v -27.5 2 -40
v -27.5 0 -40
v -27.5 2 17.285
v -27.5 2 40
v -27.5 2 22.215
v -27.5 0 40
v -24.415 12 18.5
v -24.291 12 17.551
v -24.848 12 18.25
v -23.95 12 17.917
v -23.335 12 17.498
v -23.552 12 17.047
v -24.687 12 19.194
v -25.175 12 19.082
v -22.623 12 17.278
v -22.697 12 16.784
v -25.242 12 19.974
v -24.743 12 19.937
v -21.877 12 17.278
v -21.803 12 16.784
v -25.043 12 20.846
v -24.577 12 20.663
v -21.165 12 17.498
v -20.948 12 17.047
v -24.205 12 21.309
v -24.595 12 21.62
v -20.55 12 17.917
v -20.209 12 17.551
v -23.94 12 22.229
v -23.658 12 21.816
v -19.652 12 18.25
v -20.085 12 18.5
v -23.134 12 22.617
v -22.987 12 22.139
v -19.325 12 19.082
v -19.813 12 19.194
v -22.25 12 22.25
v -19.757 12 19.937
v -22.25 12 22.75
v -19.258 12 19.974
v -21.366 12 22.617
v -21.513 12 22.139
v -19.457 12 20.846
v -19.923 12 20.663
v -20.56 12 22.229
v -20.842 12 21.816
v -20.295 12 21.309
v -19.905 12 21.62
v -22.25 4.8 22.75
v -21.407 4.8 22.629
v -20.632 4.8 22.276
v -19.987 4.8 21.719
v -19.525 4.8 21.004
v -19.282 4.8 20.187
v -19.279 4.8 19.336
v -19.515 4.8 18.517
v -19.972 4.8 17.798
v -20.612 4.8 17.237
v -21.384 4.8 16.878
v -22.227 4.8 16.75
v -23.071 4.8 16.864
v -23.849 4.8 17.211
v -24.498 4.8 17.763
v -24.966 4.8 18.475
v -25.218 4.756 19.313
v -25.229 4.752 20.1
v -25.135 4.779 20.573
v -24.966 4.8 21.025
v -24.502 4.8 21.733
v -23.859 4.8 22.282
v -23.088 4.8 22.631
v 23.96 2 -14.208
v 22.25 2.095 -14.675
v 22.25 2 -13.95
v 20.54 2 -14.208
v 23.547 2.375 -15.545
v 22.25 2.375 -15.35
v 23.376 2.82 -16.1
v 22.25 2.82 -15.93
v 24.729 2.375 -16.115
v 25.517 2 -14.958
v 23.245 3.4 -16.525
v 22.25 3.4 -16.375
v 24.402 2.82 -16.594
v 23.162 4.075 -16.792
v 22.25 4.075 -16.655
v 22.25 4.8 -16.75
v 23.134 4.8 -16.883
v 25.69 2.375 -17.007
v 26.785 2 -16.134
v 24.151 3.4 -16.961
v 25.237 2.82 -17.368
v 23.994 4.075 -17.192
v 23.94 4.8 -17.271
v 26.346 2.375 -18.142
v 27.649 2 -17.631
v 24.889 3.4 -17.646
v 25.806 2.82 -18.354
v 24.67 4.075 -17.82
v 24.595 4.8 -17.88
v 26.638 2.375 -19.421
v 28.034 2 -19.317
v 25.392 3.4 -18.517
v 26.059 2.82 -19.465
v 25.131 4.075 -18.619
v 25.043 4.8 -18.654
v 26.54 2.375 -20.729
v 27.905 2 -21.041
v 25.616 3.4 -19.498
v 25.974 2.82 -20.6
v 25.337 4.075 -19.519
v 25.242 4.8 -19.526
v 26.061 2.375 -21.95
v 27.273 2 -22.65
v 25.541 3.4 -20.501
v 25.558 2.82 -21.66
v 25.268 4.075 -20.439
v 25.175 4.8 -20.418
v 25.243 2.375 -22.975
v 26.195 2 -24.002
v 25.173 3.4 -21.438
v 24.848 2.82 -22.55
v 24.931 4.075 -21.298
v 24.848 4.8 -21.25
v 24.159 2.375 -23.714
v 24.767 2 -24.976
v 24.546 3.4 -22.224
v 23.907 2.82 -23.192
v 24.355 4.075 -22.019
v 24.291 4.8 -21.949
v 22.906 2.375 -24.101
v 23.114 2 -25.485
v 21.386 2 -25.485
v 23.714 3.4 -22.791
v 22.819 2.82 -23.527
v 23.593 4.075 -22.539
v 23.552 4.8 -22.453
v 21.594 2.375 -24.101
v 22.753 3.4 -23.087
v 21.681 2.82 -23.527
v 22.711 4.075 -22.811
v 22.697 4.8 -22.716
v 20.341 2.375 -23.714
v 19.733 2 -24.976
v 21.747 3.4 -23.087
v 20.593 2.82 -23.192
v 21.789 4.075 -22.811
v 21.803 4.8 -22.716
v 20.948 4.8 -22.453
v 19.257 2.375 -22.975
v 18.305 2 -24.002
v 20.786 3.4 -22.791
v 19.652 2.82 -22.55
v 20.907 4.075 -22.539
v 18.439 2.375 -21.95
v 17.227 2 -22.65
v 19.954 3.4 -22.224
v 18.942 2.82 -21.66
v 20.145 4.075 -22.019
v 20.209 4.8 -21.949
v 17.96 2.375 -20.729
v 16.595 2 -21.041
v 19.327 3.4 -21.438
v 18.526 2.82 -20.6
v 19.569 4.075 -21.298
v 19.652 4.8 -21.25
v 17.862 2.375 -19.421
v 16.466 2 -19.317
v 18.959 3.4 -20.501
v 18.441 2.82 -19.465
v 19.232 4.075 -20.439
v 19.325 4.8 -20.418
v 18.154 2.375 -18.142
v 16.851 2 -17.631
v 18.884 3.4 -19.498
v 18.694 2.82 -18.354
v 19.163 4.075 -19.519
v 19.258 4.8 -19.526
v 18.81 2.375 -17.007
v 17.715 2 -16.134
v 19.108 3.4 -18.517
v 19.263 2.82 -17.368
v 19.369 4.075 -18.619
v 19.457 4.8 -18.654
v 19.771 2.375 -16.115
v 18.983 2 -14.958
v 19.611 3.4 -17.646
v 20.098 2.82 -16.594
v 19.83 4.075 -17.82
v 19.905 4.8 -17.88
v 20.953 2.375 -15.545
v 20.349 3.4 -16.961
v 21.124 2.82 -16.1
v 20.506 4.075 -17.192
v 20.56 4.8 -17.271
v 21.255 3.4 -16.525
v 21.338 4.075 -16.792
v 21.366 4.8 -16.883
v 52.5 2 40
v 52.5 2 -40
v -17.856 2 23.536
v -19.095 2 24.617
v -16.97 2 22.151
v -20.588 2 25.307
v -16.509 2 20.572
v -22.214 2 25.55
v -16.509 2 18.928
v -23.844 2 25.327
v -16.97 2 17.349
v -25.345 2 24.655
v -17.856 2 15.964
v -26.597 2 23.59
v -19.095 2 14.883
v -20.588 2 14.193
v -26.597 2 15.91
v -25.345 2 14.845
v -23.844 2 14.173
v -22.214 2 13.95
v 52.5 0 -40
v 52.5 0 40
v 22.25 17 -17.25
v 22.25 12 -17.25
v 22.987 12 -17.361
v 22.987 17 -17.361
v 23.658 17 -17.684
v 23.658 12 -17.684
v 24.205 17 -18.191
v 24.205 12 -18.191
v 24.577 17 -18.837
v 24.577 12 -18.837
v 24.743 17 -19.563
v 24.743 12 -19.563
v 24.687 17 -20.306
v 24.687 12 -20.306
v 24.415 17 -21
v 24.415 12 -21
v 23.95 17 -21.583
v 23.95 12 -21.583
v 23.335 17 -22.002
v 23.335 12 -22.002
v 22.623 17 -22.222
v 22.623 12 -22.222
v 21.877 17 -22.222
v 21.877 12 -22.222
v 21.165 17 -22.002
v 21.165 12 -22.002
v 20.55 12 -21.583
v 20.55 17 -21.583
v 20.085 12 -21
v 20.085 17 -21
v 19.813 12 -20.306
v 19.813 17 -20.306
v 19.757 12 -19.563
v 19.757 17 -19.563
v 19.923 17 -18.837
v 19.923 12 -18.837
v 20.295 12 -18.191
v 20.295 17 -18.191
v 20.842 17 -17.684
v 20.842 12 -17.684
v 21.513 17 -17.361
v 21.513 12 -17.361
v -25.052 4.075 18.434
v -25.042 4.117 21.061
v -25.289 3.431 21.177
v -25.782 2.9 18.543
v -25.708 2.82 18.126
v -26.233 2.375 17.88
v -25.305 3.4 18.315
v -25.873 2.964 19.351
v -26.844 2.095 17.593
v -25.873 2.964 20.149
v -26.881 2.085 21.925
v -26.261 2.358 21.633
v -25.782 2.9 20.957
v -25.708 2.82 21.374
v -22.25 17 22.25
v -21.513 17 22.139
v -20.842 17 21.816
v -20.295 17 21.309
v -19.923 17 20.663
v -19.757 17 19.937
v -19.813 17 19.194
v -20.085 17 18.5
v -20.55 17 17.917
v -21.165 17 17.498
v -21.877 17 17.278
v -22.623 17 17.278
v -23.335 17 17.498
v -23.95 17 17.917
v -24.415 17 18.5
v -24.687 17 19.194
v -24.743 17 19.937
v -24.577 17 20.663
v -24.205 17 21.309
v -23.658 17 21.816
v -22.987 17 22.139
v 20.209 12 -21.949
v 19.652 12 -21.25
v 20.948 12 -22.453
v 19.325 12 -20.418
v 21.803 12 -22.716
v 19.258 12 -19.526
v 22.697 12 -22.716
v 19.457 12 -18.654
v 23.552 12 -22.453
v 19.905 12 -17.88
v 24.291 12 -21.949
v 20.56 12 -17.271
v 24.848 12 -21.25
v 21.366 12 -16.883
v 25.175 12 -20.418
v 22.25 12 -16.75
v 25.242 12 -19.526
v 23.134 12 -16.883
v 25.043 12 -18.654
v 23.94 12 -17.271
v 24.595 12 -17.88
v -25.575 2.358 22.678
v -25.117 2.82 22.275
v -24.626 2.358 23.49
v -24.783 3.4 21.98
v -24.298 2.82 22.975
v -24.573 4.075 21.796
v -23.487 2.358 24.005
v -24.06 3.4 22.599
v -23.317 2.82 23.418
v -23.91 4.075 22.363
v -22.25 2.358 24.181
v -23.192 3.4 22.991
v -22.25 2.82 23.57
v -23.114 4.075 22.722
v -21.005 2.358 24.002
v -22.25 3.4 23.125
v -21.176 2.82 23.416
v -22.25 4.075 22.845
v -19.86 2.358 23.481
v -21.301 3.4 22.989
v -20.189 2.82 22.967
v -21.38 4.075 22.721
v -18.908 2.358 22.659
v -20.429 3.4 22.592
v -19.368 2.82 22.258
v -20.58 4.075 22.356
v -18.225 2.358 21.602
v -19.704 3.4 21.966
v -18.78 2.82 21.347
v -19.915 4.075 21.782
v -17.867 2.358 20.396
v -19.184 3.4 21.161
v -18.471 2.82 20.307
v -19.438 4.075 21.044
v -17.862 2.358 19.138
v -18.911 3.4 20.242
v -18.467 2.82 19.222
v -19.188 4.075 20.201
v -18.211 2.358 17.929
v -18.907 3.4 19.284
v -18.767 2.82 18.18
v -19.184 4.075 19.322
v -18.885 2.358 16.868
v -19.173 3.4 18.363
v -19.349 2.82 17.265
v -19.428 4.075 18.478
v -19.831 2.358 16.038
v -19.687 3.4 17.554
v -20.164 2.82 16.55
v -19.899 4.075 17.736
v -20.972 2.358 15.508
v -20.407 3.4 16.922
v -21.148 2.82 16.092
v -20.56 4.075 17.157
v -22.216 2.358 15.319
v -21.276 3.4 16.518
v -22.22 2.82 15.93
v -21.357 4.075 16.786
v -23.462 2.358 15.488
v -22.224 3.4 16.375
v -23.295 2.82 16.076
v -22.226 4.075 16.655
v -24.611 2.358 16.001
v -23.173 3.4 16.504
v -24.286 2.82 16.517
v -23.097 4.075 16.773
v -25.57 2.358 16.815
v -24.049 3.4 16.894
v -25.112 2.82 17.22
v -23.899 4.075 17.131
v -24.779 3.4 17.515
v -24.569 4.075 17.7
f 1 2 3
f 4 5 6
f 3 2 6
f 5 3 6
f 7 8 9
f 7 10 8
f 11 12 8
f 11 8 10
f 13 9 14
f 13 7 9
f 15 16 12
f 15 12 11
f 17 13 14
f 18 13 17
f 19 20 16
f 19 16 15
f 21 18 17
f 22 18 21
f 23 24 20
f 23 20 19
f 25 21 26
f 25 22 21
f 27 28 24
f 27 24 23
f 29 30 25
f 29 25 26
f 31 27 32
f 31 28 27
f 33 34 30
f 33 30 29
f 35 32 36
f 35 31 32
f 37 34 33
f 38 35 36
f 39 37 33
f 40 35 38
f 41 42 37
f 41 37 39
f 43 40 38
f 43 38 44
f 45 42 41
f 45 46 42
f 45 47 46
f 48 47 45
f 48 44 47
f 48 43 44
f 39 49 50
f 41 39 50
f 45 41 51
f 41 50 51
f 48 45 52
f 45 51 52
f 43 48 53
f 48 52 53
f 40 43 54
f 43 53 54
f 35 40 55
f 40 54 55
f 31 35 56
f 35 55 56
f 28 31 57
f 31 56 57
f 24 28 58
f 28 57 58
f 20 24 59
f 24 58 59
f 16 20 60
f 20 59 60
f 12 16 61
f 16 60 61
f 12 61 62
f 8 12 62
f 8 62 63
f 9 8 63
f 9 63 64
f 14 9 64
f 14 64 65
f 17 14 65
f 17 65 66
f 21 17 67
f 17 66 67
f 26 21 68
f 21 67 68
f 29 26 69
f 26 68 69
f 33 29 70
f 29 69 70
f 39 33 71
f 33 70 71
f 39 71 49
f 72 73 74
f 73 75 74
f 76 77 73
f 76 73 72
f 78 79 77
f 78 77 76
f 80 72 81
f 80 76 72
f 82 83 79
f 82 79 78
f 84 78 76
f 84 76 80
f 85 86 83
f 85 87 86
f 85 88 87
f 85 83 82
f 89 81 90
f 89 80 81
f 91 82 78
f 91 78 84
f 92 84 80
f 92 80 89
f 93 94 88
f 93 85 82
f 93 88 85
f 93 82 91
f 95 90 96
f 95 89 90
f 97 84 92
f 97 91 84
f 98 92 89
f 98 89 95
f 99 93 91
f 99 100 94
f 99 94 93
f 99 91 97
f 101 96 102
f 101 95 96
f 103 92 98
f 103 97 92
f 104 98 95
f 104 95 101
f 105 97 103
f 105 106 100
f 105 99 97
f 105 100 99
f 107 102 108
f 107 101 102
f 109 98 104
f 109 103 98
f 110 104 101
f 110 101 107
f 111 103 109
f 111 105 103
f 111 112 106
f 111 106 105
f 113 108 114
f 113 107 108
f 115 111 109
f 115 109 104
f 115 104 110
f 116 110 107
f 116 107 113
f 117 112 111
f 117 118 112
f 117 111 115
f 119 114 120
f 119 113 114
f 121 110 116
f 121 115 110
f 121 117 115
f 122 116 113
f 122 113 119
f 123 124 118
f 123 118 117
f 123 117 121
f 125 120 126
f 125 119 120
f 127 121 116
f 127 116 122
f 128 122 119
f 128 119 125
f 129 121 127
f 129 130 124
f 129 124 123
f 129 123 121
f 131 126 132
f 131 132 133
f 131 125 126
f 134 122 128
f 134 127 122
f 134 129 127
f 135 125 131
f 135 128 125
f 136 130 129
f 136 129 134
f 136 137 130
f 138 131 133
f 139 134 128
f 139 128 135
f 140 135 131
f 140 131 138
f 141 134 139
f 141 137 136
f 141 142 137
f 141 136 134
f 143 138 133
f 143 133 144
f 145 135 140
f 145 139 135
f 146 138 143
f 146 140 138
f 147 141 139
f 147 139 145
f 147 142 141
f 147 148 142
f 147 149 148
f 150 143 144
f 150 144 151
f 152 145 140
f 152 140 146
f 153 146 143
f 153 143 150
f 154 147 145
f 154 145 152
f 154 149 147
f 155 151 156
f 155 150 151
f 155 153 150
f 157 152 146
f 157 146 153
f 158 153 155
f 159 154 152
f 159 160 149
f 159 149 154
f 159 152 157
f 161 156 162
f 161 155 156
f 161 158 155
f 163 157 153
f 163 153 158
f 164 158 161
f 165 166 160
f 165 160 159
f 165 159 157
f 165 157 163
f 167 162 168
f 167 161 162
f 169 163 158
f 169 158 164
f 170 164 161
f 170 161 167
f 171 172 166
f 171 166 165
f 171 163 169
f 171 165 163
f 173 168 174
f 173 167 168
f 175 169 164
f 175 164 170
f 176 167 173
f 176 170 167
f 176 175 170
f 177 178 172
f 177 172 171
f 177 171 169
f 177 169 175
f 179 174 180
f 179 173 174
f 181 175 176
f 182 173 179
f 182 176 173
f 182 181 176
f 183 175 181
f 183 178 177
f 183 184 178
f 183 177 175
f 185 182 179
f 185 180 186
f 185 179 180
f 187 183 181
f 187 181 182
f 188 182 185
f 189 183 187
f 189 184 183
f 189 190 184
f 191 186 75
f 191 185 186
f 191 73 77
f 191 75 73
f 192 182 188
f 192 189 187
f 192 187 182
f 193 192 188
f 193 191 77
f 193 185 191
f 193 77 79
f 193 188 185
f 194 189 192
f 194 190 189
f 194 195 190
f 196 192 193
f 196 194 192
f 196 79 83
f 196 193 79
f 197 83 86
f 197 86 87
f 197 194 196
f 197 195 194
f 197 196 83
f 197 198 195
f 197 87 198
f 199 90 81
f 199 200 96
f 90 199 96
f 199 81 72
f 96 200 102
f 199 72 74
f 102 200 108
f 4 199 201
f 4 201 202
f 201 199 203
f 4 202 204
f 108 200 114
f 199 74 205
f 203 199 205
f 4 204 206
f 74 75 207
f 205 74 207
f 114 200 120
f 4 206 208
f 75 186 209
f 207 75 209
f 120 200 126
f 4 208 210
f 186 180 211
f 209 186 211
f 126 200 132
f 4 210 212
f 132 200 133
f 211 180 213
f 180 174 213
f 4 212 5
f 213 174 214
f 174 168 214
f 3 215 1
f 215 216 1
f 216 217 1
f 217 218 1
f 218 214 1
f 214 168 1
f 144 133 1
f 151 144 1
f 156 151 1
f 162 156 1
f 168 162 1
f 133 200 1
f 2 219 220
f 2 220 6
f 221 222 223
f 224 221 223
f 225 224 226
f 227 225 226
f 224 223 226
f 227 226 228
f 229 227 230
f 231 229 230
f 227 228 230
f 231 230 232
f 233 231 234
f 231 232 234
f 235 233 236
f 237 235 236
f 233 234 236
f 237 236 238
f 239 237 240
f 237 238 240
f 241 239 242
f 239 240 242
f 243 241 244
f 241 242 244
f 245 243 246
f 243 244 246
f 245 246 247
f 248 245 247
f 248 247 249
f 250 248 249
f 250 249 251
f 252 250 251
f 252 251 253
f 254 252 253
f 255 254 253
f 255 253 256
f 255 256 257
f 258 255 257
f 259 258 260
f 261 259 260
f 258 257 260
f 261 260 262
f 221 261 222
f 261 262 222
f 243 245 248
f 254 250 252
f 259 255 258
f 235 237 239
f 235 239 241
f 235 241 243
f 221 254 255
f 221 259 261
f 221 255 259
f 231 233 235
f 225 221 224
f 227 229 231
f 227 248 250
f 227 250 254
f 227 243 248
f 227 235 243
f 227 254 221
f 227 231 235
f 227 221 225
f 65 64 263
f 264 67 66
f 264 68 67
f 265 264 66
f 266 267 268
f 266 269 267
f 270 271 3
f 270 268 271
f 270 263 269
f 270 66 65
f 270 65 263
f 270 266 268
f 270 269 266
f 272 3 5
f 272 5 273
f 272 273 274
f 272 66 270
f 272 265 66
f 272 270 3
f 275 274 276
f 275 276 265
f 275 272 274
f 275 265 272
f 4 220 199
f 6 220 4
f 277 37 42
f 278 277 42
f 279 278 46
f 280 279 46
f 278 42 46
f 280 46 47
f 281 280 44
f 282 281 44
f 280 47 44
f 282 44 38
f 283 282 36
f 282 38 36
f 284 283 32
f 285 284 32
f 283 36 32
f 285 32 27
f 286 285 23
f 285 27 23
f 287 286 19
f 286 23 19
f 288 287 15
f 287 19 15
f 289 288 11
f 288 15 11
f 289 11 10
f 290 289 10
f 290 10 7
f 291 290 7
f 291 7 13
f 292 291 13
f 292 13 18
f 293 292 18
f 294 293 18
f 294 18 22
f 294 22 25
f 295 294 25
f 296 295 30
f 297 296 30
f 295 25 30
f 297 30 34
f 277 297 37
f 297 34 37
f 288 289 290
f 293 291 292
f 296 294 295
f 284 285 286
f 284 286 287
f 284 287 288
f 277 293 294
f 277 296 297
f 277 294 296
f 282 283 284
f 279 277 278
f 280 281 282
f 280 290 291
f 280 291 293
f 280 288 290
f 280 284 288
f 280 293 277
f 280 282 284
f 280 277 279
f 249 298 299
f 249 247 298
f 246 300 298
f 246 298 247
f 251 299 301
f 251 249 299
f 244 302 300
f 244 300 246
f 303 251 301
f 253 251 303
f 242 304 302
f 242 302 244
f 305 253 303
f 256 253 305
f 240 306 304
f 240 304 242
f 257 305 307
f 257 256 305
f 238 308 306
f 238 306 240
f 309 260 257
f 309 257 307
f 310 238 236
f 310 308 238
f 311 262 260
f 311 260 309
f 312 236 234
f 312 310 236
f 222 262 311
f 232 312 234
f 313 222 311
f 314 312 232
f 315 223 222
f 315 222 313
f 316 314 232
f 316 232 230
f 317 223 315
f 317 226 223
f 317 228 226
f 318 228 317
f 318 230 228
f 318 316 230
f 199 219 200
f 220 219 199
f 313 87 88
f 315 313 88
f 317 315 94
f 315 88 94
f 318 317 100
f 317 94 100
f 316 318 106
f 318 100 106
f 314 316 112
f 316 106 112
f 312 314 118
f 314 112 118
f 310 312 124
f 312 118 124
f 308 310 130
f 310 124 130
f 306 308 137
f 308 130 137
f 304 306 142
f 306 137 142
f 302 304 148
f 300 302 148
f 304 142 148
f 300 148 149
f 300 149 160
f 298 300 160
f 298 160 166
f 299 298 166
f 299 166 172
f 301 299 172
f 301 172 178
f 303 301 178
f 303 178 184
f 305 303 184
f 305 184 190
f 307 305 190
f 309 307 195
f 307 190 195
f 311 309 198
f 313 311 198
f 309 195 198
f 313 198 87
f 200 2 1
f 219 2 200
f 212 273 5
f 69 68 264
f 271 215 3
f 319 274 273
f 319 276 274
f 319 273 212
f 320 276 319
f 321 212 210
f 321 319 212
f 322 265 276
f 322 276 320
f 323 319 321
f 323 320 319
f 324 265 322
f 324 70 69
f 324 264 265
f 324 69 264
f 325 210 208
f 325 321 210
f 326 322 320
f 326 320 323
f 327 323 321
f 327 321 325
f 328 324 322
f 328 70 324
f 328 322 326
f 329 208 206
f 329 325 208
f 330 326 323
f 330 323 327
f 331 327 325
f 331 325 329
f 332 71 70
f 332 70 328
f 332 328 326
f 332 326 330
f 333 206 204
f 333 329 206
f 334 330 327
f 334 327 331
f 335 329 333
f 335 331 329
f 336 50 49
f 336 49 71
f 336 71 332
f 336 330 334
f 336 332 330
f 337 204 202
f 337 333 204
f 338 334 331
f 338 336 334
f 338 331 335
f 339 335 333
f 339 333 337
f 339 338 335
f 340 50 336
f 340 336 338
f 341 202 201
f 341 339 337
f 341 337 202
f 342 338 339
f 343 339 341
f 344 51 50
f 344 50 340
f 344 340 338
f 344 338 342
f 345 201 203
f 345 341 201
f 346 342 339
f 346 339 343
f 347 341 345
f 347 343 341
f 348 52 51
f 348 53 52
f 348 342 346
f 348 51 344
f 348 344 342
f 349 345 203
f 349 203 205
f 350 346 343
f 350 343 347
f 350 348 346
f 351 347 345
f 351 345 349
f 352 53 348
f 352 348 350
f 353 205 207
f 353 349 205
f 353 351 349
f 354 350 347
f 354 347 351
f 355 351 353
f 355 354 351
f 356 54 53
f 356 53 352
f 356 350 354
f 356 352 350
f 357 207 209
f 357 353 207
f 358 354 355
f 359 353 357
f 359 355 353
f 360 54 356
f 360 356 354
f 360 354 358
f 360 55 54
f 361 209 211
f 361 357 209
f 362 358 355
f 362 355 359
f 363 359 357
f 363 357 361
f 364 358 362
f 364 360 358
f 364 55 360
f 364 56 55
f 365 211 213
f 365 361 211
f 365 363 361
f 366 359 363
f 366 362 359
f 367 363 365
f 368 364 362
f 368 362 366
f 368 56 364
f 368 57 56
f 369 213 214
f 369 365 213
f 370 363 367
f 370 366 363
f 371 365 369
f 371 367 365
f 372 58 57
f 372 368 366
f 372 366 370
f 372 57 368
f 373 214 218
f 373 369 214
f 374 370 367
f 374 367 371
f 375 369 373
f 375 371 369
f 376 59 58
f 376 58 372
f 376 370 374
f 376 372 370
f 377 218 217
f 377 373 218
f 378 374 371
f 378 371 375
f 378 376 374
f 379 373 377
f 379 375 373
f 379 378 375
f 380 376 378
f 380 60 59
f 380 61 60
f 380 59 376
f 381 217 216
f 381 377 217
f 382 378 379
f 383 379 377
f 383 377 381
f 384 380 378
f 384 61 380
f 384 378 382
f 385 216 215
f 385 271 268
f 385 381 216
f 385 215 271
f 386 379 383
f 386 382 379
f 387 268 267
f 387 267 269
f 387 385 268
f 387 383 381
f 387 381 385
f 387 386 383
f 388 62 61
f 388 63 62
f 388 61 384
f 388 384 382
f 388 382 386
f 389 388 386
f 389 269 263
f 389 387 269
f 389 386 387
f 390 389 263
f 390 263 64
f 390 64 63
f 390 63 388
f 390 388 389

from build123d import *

# Parameters (mm, degrees)
SKETCH1_W           = 55
SKETCH1_H           = 55
BOSS_EXTRUDE1_DEPTH = 2
SKETCH2_R           = 3
BOSS_EXTRUDE2_DEPTH = 10
FILLET1_R           = 2.8
SKETCH3_R           = 2.5
BOSS_EXTRUDE3_DEPTH = 5


with BuildPart() as part:
    # Sketch1 → Boss-Extrude1 (new body)
    with BuildSketch(Plane(origin=(0, 0, 0), x_dir=(1, 0, 0), z_dir=(0, 1, 0))):
        Polygon((52.5, 40), (52.5, -40), (-27.5, -40), (-27.5, -27.5), (27.5, -27.5), (27.5, 27.5), (-27.5, 27.5), (-27.5, 40), align=None)
        Rectangle(SKETCH1_W, SKETCH1_H)
    extrude(amount=BOSS_EXTRUDE1_DEPTH)

    # Sketch2 → Boss-Extrude2 (add)
    with BuildSketch(Plane(origin=(0, 2, 0), x_dir=(1, 0, 0), z_dir=(0, 1, 0))):
        with Locations(Location((-22.25, -19.75, 0), (0, 0, 270))):
            Circle(SKETCH2_R)
        with Locations(Location((22.25, 19.75, 0), (0, 0, 270))):
            Circle(SKETCH2_R)
    extrude(amount=BOSS_EXTRUDE2_DEPTH)

    # Fillet1
    fillet1_edges = [part.edges().sort_by_distance(p)[0] for p in [
        (-22.25, 2, 16.75),
        (22.25, 2, -22.75),
    ]]
    fillet(fillet1_edges, radius=FILLET1_R)

    # Sketch3 → Boss-Extrude3 (add)
    with BuildSketch(Plane(origin=(0, 12, 0), x_dir=(1, 0, 0), z_dir=(0, 1, 0))):
        with Locations(Location((-22.25, -19.75, 0), (0, 0, 270))):
            Circle(SKETCH3_R)
        with Locations(Location((22.25, 19.75, 0), (0, 0, 270))):
            Circle(SKETCH3_R)
    extrude(amount=BOSS_EXTRUDE3_DEPTH)


solid = part.part
